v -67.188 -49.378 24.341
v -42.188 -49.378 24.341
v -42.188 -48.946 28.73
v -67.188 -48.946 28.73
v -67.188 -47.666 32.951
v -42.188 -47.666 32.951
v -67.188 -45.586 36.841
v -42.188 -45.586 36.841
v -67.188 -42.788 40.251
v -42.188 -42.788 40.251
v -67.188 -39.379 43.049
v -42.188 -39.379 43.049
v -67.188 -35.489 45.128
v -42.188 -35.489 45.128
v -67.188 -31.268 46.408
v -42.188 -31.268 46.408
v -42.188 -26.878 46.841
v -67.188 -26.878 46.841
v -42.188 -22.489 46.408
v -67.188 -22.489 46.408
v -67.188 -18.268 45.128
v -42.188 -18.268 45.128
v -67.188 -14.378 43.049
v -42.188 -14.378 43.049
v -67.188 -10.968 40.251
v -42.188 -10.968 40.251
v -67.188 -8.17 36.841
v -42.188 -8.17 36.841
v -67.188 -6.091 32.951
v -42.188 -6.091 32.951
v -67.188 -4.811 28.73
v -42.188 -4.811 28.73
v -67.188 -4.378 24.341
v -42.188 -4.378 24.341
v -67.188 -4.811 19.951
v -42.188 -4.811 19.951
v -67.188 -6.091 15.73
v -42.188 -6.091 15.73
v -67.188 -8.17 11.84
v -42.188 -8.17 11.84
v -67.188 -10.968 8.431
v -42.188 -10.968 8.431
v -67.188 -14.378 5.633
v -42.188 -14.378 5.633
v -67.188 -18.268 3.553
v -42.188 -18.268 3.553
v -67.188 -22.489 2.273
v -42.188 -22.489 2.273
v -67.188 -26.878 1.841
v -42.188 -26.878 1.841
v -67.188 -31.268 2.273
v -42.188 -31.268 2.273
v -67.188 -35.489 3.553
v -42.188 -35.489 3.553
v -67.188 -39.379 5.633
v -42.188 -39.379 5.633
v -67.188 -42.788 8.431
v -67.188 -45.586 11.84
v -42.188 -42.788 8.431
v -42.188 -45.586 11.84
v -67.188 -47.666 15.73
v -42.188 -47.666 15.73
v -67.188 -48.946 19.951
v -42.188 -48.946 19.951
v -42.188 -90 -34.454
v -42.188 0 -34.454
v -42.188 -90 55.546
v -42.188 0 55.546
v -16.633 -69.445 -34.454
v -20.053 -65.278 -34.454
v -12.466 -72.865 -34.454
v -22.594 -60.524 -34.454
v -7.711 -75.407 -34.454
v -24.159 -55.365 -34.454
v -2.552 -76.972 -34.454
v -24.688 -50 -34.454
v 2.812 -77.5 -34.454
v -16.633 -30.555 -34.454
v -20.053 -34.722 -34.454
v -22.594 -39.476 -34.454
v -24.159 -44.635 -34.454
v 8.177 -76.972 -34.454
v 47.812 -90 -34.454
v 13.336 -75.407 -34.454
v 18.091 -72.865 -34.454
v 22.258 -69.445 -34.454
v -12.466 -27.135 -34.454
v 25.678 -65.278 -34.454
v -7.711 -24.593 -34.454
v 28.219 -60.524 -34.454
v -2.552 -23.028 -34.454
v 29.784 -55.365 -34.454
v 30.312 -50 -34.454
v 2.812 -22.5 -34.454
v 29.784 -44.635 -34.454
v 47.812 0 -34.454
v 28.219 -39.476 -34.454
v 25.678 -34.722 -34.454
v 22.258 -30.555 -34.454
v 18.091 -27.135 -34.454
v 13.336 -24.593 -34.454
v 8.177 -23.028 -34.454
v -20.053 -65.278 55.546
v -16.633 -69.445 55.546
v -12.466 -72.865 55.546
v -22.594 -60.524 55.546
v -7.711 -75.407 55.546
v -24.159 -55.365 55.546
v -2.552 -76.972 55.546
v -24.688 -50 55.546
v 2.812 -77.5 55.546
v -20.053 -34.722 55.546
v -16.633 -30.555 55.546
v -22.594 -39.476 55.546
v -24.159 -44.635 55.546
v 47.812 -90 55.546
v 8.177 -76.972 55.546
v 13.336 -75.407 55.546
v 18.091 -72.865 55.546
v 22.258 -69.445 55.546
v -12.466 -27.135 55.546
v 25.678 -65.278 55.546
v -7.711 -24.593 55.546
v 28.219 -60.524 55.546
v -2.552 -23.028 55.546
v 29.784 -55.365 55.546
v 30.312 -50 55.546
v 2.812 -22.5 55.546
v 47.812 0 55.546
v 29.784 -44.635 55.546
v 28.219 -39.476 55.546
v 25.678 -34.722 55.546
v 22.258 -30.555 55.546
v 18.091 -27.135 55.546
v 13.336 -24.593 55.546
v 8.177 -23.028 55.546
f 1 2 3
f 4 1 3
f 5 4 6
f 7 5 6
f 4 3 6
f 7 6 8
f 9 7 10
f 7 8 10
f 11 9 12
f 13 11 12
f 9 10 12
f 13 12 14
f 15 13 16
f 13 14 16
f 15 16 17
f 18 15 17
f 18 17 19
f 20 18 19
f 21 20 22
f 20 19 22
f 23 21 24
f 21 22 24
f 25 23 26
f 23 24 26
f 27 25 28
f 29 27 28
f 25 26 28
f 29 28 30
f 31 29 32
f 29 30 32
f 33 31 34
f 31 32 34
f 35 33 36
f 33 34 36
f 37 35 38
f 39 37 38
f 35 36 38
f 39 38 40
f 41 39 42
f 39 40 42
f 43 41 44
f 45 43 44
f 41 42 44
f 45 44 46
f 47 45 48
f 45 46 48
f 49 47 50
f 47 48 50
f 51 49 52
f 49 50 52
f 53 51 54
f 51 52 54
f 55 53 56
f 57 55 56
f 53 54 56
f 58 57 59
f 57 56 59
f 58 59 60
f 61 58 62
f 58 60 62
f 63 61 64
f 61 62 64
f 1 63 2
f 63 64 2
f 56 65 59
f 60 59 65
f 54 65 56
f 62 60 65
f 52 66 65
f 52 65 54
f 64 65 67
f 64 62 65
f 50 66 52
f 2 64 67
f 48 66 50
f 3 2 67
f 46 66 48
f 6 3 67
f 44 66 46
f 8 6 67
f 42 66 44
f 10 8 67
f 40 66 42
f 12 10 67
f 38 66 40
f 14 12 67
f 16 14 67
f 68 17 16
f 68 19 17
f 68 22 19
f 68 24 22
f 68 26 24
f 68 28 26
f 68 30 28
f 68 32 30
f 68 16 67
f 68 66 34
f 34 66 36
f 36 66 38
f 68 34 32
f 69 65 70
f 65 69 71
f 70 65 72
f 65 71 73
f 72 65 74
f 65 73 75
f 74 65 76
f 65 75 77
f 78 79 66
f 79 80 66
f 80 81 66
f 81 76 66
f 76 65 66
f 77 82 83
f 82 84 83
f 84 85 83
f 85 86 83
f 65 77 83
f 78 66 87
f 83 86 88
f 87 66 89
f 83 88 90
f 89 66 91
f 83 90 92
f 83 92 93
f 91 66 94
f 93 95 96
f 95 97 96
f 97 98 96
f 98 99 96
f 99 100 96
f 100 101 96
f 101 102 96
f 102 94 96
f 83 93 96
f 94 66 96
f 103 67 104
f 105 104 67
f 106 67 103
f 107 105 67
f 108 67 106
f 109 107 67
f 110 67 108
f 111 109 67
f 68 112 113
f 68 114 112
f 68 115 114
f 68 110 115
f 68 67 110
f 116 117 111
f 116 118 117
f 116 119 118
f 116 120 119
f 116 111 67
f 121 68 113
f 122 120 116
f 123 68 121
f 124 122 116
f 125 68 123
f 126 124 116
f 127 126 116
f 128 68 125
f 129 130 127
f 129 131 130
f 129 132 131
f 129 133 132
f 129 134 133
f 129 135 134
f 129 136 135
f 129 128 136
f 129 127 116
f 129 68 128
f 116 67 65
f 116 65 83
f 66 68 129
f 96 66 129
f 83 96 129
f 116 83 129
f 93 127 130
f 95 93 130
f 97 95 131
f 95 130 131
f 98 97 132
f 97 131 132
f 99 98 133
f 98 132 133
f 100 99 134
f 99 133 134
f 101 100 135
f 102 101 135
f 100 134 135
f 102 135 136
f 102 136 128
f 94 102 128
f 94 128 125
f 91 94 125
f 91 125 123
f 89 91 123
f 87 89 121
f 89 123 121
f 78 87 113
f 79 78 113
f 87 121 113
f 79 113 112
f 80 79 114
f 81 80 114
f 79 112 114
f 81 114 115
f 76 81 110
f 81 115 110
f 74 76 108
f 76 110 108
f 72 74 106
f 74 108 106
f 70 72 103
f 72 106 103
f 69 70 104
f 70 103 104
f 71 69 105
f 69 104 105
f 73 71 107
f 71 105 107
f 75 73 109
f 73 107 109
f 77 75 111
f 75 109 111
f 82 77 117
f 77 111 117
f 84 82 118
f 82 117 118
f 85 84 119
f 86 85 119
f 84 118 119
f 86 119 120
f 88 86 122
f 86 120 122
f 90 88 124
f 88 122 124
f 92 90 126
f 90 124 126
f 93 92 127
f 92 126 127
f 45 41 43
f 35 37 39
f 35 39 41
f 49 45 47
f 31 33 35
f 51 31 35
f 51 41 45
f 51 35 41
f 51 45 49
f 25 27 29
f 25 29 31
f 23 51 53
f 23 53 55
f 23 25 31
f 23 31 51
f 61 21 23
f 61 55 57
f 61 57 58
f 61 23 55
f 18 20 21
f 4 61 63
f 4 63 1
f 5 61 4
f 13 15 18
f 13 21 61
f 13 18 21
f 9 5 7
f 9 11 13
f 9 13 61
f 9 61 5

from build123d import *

# Parameters (mm, degrees)
F0_W     = 90
F0_H     = 90
F1_DEPTH = 90
F2_R     = 27.5
F3_DEPTH = 90
F4_R     = 22.5
F5_DEPTH = 25


with BuildPart() as f1:
    # F0 (on Front) → F1 (new body)
    with BuildSketch(Plane.XZ):
        with Locations((2.812499, 10.546107)):
            Rectangle(F0_W, F0_H)
    extrude(amount=F1_DEPTH)

    # F2 (on face) → F3 (cut, through all)
    with BuildSketch(Plane.XY.offset(55.546107)):
        with Locations((2.812499, -50)):
            Circle(F2_R)
    extrude(amount=-F3_DEPTH, mode=Mode.SUBTRACT)

    # F4 (on face) → F5 (join)
    with BuildSketch(Plane(origin=(-42.187501, 0, 0), x_dir=(0, -1, 0), z_dir=(-1, 0, 0))):
        with Locations((26.878221, 24.340734)):
            Circle(F4_R)
    extrude(amount=F5_DEPTH)


solid = f1.part
